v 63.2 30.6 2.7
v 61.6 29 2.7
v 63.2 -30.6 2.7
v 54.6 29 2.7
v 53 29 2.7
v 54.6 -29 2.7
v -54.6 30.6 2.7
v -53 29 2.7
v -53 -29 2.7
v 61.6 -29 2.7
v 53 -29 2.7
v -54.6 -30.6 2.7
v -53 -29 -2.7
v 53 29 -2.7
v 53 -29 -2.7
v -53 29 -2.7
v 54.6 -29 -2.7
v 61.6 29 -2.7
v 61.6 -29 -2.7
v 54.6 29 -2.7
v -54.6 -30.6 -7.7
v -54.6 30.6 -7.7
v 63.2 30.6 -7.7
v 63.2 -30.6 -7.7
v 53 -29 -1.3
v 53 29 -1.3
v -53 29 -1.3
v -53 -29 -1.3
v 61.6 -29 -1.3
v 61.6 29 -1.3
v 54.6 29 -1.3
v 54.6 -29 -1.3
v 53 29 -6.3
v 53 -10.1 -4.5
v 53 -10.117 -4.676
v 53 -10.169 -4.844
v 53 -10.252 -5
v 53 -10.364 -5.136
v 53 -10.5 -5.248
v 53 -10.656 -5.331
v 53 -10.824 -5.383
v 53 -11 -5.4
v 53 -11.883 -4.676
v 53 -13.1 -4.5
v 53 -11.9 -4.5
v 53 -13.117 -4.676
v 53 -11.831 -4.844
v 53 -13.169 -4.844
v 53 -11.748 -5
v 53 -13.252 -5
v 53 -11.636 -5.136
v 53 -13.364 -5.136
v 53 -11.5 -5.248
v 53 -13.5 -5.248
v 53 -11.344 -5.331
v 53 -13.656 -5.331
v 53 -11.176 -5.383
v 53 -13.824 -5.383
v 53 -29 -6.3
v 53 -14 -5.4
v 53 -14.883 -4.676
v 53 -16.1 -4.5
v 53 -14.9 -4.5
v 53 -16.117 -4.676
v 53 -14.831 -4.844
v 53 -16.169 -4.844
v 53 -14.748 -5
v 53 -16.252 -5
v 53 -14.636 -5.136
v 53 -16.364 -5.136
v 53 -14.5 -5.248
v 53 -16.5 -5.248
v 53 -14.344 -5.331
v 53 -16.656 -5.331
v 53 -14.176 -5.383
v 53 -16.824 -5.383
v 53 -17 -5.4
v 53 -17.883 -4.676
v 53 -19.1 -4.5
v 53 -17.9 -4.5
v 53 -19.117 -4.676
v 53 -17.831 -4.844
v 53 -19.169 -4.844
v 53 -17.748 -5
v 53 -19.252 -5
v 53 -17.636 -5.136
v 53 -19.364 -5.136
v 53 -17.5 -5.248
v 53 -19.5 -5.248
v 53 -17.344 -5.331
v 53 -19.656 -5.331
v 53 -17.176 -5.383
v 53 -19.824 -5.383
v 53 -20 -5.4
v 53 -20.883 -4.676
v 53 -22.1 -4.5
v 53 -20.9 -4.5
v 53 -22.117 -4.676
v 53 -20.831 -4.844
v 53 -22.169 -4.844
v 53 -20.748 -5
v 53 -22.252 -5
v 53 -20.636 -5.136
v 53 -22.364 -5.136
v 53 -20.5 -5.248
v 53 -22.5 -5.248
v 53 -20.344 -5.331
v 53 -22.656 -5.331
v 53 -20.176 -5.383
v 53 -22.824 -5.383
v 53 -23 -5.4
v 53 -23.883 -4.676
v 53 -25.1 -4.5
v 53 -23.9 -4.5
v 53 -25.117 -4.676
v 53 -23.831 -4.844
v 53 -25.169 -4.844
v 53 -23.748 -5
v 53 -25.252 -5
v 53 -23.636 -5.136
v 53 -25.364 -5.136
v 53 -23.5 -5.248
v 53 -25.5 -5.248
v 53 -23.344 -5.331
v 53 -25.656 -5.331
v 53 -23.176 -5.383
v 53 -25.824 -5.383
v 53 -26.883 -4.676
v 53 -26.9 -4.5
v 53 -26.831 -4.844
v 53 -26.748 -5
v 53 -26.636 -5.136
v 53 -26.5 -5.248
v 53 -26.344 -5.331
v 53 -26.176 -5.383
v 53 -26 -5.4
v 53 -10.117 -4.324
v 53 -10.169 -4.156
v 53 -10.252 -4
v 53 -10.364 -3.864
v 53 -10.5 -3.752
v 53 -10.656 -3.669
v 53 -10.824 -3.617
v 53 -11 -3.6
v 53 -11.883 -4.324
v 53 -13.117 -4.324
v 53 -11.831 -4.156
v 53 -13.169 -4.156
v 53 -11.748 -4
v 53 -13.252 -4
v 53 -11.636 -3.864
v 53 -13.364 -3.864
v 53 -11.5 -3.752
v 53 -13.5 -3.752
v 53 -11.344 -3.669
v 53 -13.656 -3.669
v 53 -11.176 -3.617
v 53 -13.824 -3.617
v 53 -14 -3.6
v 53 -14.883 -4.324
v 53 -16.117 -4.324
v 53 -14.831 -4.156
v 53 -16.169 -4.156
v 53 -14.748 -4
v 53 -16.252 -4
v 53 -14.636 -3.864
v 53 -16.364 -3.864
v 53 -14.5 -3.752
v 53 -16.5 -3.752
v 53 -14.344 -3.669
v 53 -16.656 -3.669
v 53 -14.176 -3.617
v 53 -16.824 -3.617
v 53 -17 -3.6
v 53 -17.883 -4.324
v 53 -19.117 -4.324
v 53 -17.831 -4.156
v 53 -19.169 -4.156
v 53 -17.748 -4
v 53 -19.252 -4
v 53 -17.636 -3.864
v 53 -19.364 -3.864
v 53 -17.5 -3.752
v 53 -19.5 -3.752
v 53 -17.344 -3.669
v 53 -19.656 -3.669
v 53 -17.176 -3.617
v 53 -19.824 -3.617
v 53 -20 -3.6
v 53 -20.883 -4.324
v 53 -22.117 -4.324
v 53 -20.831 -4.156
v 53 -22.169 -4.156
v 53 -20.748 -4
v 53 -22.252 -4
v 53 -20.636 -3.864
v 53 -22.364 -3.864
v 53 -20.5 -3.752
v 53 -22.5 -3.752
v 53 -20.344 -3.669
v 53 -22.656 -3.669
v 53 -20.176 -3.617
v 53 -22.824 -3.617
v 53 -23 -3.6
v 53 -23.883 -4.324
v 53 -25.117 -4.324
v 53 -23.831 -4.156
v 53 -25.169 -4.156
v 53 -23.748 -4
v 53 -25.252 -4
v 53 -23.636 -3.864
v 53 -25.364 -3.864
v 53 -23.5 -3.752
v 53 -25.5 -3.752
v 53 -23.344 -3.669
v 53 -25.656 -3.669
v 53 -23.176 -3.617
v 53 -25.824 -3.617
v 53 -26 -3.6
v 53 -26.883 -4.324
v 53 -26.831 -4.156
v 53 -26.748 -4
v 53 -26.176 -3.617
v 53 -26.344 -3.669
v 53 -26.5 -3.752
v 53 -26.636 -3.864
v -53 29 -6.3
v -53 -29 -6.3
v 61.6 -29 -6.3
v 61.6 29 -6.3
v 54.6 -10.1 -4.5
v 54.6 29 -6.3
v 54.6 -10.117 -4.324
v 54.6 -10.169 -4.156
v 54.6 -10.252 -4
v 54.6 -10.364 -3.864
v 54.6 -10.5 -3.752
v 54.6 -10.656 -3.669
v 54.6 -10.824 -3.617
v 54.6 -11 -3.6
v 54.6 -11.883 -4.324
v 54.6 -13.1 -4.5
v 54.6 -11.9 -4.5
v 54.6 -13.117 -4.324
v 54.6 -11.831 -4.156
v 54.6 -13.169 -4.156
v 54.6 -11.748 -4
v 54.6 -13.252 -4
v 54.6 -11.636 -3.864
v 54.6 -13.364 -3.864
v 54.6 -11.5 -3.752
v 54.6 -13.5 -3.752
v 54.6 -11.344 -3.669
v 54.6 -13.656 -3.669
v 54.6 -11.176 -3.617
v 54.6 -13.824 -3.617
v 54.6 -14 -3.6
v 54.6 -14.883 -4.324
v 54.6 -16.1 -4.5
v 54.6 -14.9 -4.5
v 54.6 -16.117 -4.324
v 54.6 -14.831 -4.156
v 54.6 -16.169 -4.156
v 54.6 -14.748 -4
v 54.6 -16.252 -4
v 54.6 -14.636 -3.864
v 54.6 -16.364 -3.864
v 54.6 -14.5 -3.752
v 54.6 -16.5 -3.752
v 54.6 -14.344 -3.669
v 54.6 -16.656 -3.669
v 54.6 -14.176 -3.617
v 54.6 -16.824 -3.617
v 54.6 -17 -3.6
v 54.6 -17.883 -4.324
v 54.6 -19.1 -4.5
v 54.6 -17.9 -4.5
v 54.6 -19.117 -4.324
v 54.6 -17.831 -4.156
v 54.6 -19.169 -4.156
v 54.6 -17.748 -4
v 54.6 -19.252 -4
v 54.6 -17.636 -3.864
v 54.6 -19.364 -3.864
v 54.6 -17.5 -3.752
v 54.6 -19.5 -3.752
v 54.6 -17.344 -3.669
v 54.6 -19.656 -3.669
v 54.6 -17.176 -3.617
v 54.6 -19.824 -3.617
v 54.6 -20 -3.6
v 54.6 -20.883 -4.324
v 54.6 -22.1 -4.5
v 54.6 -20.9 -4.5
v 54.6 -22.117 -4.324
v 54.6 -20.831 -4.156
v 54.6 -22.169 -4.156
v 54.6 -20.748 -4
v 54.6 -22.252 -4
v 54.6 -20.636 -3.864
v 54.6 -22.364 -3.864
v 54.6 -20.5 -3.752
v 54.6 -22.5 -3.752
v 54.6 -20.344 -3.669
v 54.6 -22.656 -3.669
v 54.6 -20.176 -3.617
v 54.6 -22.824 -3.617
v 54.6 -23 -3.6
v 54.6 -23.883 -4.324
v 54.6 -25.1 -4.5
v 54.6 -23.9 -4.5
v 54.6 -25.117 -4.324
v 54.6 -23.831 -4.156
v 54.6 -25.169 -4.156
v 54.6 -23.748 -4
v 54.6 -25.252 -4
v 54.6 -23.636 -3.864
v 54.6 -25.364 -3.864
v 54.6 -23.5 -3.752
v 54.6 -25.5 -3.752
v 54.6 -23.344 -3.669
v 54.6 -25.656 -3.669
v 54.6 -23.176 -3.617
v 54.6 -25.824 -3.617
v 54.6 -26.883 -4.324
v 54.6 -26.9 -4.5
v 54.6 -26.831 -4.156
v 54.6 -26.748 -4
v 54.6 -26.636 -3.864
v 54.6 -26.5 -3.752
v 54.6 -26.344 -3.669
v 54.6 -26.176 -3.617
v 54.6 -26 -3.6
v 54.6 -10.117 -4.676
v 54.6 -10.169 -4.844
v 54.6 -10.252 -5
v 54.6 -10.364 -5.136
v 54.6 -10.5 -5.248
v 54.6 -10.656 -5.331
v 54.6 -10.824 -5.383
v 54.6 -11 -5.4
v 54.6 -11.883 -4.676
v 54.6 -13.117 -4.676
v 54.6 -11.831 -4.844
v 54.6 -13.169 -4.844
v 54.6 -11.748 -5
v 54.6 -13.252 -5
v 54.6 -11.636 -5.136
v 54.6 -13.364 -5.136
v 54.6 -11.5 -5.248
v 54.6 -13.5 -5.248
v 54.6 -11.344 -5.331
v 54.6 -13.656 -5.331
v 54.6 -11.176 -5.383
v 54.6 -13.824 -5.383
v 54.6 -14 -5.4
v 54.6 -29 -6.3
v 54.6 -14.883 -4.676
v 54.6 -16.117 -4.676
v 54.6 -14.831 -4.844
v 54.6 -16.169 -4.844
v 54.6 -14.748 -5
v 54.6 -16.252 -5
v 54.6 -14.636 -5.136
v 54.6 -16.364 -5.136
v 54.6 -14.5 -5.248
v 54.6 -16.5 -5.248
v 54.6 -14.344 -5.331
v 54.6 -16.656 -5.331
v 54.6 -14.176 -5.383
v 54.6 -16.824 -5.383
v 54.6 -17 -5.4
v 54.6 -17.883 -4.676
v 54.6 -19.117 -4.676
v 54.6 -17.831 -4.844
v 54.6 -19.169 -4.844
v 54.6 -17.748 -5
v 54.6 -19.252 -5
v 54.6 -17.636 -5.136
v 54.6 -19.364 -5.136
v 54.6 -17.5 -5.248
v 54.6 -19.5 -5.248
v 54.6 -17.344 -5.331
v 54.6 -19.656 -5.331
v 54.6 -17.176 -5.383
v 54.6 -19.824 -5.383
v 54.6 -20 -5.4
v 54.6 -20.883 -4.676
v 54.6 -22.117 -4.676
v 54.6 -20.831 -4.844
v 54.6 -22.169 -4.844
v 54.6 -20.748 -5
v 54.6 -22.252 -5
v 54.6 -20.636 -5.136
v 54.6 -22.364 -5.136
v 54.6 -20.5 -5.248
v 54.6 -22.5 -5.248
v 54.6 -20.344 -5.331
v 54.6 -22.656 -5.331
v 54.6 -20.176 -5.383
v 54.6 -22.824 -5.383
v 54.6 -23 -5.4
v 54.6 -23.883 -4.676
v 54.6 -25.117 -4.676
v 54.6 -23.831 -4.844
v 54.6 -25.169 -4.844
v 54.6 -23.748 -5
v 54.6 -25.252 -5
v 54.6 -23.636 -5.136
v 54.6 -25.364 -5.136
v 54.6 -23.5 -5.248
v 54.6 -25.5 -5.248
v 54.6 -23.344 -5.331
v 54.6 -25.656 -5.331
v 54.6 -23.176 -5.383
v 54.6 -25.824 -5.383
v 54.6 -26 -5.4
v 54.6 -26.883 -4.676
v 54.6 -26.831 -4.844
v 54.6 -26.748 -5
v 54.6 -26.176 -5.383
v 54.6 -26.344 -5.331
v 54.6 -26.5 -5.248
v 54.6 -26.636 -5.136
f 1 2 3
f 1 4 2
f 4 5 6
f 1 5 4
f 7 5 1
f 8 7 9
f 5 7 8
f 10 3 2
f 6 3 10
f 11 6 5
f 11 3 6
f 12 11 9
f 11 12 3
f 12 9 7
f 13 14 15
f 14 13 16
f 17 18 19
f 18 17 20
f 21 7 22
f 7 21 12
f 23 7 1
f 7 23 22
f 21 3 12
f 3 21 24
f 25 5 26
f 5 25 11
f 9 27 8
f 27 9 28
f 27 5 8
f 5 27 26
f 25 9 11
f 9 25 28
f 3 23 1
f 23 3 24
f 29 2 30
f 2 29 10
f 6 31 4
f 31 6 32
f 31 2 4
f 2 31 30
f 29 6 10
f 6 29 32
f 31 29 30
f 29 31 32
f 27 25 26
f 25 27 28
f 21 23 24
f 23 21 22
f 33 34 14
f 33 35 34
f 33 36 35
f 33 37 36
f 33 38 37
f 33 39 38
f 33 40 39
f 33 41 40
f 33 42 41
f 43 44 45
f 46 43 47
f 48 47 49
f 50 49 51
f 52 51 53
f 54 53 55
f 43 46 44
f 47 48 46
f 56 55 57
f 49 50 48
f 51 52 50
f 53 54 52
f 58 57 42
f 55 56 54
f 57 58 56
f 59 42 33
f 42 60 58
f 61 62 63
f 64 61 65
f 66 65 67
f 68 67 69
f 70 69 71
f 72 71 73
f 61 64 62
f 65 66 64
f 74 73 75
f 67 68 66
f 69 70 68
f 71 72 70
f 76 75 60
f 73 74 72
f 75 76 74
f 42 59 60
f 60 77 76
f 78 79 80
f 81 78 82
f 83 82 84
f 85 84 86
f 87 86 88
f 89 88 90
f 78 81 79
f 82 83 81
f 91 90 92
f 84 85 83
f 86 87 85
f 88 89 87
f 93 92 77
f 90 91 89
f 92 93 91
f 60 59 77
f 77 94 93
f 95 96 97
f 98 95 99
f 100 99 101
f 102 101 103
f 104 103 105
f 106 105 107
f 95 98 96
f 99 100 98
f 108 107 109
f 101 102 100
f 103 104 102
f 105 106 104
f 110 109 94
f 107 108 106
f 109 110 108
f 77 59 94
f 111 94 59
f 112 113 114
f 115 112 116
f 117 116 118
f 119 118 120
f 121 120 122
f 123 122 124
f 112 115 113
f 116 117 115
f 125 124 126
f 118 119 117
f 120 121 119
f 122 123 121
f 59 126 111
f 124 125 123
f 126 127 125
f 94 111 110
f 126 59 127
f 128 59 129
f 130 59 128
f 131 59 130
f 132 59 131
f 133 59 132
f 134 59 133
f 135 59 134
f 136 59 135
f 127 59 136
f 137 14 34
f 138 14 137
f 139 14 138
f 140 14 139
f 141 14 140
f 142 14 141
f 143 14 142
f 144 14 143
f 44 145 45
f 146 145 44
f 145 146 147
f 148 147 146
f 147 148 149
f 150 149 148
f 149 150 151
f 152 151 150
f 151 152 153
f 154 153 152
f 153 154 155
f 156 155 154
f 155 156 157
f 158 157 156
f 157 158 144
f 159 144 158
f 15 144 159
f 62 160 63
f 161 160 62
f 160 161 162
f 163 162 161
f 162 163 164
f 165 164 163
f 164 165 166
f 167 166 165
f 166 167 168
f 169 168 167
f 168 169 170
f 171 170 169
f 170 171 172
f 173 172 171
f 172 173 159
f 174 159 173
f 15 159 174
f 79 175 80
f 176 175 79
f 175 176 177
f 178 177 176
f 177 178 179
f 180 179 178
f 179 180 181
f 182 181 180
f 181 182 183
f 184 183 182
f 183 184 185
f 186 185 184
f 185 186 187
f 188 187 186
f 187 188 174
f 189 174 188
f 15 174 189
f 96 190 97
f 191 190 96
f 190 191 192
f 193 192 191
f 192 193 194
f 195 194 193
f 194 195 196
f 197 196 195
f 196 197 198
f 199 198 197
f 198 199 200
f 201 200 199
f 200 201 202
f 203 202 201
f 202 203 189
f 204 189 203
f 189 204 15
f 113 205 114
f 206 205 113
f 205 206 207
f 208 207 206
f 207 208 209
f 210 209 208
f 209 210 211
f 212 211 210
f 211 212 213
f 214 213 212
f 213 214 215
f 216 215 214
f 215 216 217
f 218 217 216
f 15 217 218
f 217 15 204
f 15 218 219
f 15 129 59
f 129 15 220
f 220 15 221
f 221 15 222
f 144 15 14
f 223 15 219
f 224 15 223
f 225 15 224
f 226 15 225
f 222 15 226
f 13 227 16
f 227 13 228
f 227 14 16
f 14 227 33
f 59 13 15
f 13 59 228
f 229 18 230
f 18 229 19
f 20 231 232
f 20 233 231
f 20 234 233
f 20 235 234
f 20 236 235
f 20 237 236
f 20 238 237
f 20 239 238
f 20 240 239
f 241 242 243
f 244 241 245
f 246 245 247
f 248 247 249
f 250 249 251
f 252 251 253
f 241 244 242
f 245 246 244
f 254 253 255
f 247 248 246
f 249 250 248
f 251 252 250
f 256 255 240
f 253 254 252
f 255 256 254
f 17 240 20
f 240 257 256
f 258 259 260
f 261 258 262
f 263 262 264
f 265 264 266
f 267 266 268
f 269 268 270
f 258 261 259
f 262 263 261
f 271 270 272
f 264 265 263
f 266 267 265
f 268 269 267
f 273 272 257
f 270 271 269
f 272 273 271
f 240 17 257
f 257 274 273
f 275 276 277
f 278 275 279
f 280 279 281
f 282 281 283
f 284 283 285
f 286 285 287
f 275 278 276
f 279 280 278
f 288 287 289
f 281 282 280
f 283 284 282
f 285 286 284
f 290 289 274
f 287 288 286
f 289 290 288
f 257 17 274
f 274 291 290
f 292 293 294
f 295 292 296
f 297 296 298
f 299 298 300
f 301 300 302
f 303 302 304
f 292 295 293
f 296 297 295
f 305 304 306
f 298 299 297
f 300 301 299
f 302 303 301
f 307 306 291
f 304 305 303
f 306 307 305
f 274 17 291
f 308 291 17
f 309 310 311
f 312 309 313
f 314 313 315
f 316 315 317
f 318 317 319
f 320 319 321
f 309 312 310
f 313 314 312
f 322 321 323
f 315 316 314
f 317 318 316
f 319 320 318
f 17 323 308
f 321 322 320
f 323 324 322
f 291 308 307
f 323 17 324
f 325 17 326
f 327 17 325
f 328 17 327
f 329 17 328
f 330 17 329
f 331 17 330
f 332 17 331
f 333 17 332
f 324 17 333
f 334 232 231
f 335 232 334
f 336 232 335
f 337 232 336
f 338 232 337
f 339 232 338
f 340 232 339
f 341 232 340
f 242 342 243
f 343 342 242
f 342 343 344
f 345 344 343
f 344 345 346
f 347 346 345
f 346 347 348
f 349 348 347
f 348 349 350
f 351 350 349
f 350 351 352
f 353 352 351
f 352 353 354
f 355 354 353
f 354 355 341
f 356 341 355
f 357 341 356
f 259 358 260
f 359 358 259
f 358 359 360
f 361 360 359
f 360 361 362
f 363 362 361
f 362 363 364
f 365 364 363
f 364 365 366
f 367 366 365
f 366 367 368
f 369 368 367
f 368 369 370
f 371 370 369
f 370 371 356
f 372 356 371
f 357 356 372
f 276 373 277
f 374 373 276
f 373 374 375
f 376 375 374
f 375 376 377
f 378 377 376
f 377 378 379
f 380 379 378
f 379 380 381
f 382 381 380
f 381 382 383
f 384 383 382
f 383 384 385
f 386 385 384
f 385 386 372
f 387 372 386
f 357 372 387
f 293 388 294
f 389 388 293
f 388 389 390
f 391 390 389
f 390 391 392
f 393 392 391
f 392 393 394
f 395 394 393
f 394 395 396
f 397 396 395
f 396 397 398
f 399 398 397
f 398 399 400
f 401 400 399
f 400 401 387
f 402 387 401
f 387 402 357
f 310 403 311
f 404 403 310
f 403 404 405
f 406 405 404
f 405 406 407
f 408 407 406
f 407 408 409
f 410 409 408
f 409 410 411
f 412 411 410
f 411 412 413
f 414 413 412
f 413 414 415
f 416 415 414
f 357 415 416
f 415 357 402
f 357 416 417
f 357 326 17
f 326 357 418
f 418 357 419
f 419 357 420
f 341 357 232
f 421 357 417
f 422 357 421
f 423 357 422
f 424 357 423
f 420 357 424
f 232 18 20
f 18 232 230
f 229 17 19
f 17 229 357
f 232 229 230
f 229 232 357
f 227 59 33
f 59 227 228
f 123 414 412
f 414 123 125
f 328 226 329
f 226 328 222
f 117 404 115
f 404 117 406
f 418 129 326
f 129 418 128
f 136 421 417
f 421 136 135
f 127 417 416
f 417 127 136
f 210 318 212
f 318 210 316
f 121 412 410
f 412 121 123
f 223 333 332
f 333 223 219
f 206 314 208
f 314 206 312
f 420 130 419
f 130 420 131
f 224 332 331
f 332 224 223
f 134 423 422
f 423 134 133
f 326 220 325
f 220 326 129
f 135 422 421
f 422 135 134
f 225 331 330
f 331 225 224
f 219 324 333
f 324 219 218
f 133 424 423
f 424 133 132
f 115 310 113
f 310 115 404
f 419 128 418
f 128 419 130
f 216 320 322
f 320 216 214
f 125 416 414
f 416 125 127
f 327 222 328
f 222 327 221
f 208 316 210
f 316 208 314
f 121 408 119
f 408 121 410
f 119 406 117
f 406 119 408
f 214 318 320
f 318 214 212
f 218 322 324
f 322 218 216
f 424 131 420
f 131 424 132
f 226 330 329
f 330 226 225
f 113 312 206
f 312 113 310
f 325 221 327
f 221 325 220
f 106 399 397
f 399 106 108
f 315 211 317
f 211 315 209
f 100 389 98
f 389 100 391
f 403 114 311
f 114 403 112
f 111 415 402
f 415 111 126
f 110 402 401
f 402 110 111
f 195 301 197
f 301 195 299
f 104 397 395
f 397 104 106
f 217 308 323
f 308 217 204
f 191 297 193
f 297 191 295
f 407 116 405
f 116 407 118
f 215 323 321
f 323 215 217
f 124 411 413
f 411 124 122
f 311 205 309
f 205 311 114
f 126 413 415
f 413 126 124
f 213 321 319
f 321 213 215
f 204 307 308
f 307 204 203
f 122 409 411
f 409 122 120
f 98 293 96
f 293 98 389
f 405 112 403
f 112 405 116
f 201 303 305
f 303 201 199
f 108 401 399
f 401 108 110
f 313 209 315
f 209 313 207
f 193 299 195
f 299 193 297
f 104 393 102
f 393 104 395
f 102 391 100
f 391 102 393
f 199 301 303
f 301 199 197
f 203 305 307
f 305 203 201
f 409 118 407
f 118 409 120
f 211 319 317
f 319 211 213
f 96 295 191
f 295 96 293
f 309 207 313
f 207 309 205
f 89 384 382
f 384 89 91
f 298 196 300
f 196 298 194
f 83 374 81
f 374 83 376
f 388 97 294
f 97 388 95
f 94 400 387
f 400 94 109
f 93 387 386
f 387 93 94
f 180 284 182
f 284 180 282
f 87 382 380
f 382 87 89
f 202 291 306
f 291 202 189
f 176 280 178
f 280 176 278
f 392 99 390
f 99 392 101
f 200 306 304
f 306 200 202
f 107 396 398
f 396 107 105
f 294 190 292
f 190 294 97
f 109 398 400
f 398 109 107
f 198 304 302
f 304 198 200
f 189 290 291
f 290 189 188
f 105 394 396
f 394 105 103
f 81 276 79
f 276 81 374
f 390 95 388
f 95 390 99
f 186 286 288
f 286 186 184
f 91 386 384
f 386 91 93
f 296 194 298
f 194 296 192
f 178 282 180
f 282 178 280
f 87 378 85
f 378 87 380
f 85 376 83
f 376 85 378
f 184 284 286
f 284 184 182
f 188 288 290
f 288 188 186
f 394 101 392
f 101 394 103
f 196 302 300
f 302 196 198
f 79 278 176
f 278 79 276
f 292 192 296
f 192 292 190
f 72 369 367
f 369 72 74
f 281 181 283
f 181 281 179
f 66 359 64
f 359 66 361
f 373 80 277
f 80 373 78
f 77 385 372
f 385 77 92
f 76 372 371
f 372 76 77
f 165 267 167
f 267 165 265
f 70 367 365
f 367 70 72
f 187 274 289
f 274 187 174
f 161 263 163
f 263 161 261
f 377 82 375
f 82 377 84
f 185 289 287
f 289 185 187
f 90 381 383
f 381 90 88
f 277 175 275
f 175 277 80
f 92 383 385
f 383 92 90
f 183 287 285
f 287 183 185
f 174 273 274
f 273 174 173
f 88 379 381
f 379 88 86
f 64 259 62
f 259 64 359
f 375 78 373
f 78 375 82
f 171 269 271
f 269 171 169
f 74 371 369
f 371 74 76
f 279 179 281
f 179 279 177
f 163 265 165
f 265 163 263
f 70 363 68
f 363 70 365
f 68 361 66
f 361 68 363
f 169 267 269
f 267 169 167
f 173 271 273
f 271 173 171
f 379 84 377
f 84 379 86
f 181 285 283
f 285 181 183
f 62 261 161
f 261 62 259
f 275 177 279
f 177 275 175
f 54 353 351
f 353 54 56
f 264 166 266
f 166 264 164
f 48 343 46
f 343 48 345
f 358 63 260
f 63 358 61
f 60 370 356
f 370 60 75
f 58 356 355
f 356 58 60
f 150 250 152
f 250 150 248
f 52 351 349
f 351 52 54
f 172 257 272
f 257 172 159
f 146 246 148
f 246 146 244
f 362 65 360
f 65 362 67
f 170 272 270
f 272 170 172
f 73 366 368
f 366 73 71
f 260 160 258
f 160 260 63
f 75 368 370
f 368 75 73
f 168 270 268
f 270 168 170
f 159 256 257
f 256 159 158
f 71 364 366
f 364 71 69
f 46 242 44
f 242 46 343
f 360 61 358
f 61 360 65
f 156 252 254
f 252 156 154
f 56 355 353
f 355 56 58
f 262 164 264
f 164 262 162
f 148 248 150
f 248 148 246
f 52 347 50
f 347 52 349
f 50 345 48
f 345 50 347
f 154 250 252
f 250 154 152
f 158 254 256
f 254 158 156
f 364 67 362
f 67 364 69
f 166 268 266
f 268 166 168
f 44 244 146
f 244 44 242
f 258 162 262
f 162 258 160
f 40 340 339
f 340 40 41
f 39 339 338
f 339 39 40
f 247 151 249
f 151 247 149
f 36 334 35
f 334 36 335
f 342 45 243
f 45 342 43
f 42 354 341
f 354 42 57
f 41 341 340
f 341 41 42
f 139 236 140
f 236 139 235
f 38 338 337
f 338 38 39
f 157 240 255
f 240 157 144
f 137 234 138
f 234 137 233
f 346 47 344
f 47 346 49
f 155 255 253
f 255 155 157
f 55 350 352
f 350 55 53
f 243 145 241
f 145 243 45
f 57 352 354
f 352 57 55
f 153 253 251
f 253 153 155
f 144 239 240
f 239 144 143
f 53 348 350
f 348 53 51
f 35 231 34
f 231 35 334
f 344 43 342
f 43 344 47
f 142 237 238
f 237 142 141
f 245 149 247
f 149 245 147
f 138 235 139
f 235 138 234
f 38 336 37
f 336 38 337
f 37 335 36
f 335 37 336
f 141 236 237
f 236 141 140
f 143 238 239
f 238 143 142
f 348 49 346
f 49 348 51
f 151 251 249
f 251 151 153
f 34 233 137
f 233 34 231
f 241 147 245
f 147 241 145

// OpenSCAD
len_bottom = 106;
depth_bottom = 58;
thickness_walls = 1.6;
// screen backlight panel
// height of frame without thickness bottom
height_frame = 4;
thickness_bottom = 1.4;
depth_pcb = 7; 

// window_frame();

translate([0, 0, -5])
kit_frame();
set_frame();
// frame_is_match();

module window_frame() {
  difference() {
    color("green")
    cube([len_bottom, depth_bottom, height_frame], true);
    cube([len_bottom-10, depth_bottom-4, height_frame+1], true);
    translate([len_bottom/2-1, 0, 0])
    cube([4, depth_bottom-4, height_frame+1], true);
    translate([-len_bottom/2+4, 0, 0])
    cube([4, depth_bottom-4, height_frame+1], true);
  }
}

module kit_frame() {
  difference() {
    set_frame();
    for(i=[1:6]){
      translate([len_bottom/2, -depth_bottom/2+3*i, 0.5])
      rotate([0, 90, 0])
      cylinder(d=1.8, h=5, center=true, $fn=32);
    }
    
  }  
}

module set_frame() {
  color("lime")
  translate([0, 0, -height_frame/2])
  bottom();
  frame();
  translate([len_bottom/2+depth_pcb/2+thickness_walls, 0, 0])
  set_frame_pcb();
}

module set_frame_pcb() {
  color("lime")
  translate([0, 0, -height_frame/2])
  bottom_pcb();
  frame_pcb();
}

module bottom_pcb() {
  cube([depth_pcb+2*thickness_walls, depth_bottom+2*thickness_walls, thickness_bottom], true);
}

module frame_pcb() {
  difference() {
    cube([depth_pcb+2*thickness_walls, depth_bottom+2*thickness_walls, thickness_bottom+height_frame], true);
    color("red")
    cube([depth_pcb, depth_bottom, thickness_bottom+height_frame+0.1], true);
  }
}

module bottom() {
  cube([len_bottom+2*thickness_walls, depth_bottom+2*thickness_walls, thickness_bottom], true);
}

module frame() {
  difference() {
    cube([len_bottom+2*thickness_walls, depth_bottom+2*thickness_walls, thickness_bottom+height_frame], true);
    color("red")
    cube([len_bottom, depth_bottom, thickness_bottom+height_frame+0.1], true);
  }
}

module frame_is_match() {
  difference() {
    set_frame();
    // cut is match
    translate([106/4, 0, 0])
    cube([106/2+4, 58+4, 4*2], true);
  }
  // is match wall
  translate([0, depth_bottom/2+thickness_walls/2, 0])
  cube([5, thickness_walls, thickness_bottom+height_frame], true);
  
  // is match bottom
  translate([0, depth_bottom/2-4, -height_frame/2])
  cube([5, 5, thickness_bottom], true);
}
